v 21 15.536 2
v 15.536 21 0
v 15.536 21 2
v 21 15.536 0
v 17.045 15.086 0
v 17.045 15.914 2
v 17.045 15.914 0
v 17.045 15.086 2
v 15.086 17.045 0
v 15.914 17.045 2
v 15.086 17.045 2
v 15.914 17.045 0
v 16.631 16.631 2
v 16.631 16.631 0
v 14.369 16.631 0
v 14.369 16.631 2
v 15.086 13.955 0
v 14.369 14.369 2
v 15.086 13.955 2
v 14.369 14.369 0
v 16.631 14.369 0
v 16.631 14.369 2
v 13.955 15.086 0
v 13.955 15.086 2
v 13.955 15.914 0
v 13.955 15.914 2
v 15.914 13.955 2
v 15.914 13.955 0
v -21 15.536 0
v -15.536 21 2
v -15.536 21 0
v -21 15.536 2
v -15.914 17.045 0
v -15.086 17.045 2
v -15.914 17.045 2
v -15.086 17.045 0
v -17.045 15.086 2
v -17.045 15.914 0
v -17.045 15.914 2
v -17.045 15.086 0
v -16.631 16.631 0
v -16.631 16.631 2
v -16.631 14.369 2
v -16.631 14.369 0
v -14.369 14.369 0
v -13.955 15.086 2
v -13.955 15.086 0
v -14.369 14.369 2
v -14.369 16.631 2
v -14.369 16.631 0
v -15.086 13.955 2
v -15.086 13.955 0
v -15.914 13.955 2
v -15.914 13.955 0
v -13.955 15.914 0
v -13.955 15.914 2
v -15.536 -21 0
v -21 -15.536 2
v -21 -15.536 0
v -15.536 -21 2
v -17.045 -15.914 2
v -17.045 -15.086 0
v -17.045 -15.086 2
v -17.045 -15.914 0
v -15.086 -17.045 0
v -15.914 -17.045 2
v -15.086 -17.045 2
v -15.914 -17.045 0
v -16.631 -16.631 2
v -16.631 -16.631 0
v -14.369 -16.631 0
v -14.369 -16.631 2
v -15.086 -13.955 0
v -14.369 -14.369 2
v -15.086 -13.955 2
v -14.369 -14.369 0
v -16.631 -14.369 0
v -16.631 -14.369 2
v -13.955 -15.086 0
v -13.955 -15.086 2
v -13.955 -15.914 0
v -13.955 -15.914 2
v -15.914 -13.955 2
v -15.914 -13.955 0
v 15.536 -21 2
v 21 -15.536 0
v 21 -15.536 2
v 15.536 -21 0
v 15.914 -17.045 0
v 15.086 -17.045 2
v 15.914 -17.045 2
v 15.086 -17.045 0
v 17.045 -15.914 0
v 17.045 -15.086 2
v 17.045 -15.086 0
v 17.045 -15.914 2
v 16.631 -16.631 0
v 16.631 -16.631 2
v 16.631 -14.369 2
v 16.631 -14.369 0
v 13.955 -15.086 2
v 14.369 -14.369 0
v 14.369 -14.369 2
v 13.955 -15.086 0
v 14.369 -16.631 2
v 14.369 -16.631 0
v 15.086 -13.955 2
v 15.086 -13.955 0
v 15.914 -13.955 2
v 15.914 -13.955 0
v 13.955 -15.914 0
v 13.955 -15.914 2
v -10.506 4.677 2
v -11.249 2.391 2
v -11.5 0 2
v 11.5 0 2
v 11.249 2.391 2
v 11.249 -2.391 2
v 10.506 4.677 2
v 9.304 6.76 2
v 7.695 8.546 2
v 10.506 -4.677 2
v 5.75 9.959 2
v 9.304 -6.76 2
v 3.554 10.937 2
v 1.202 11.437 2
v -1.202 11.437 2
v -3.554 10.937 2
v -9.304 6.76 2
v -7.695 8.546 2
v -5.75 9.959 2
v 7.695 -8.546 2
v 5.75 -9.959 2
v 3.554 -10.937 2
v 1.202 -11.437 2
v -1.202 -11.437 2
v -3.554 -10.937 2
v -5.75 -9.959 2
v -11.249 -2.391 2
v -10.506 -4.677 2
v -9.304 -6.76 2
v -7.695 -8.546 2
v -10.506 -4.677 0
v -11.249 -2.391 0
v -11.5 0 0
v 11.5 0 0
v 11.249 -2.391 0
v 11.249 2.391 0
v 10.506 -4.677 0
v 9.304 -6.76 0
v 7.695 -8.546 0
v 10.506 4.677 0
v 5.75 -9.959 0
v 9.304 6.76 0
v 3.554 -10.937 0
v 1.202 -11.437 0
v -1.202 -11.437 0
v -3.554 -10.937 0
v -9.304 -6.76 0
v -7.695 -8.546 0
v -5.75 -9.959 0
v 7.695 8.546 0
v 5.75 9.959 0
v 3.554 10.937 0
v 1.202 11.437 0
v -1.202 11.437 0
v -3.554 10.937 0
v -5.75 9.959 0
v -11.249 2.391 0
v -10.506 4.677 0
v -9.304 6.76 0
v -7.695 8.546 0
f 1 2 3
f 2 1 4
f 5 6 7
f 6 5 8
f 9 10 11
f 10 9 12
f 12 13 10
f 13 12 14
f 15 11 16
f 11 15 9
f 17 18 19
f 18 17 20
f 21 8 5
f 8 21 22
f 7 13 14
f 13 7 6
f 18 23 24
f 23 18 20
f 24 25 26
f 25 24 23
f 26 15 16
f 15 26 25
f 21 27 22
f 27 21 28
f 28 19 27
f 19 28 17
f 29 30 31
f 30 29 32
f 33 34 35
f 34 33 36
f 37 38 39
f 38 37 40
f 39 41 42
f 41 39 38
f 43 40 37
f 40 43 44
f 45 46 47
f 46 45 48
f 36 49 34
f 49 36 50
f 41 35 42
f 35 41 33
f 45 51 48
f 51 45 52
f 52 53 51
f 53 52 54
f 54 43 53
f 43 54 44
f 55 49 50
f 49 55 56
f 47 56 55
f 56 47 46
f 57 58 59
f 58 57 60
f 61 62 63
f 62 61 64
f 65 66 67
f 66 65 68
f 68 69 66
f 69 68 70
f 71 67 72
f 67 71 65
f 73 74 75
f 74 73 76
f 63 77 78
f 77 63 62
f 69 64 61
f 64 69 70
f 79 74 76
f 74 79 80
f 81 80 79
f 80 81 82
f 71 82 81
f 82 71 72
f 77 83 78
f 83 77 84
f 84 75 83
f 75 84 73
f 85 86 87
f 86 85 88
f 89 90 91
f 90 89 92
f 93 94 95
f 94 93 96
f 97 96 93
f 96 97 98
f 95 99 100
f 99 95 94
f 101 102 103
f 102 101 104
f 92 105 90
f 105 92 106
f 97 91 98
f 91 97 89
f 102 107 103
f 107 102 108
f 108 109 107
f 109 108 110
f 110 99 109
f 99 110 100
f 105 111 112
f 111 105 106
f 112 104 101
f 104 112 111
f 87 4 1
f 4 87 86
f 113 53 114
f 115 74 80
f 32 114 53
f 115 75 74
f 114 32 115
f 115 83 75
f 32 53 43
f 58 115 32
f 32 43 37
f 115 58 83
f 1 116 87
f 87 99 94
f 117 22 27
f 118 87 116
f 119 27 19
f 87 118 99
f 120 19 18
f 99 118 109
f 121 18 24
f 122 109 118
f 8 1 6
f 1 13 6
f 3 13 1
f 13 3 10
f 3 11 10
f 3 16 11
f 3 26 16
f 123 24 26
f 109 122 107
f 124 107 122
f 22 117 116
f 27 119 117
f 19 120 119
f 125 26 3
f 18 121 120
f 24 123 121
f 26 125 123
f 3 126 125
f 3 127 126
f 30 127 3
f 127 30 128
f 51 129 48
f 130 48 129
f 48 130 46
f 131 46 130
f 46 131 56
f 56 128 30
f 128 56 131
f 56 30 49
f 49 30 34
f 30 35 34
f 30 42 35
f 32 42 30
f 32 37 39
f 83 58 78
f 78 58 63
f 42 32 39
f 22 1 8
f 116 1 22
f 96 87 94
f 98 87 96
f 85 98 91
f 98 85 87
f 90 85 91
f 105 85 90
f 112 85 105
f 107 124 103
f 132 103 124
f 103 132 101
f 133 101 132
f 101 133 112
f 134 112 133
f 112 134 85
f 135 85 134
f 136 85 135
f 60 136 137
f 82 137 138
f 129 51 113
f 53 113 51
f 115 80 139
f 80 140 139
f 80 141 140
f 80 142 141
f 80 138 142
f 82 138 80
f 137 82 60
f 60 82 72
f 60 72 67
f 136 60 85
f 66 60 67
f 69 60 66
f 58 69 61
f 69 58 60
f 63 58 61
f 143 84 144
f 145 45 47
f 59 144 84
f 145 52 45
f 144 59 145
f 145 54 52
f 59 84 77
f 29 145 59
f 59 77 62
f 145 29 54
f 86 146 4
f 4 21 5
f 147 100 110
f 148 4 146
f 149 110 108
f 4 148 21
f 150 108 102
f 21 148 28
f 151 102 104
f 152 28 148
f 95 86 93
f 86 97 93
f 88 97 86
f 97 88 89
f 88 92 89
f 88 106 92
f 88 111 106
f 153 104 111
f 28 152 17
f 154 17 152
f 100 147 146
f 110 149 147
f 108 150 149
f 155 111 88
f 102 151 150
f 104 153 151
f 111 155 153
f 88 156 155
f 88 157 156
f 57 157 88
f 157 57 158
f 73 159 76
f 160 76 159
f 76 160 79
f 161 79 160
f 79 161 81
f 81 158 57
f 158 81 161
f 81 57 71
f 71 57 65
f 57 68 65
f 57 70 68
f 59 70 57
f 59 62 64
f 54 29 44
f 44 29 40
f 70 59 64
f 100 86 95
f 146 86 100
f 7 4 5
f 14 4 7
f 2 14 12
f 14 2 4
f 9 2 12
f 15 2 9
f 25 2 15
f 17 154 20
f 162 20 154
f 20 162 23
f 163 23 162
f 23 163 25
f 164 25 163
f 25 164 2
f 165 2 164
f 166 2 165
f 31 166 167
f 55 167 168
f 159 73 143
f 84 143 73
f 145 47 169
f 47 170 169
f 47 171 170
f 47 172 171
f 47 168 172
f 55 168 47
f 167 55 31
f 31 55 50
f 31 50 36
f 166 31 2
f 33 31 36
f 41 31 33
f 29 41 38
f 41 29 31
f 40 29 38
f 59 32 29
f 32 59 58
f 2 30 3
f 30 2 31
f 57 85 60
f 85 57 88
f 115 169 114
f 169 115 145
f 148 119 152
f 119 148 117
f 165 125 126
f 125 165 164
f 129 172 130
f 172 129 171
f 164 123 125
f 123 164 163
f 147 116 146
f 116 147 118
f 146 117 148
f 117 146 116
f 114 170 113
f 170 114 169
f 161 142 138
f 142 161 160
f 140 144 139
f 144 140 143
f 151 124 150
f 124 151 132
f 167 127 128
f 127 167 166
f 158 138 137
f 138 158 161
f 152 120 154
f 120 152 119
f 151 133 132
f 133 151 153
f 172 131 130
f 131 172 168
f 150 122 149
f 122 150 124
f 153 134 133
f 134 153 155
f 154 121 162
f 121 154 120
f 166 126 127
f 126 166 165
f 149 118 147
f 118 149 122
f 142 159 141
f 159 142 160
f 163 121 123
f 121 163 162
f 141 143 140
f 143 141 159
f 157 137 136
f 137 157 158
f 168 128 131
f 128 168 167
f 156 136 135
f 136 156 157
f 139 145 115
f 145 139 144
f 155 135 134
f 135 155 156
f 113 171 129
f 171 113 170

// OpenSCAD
thickness=2;
hole_pitch=31;//26;
rad = 6;
notch = false;

module NEMA17_spacer(){
	//body
	difference(){
		translate([0,0,thickness/2]) cube([hole_pitch+11,hole_pitch+11,thickness],center=true);
		for(i=[0,1,2,3]){
			rotate([0,0,i*90+45]) union() {
				//translate([(hole_pitch-8)*sqrt(2)+2.5-2.5/sqrt(2),0,thickness/2]) {
				translate([(hole_pitch+11)*sqrt(2)/2-4.5*sqrt(2)+5,0,thickness/2]) {
					cube([5,10,thickness+.2],center=true);
				}
				translate([sqrt(2)*hole_pitch/2,0,0]) cylinder(r=3.2/2,h=thickness*4,center=true,$fn=12);
			}
			
		}
		cylinder(r=23/2,h=thickness*2.2,center=true); // Changed from 22.4 - AB

	// Corner notch added by AB
		if(notch)
		{
			translate([-hole_pitch/2+3,hole_pitch/2-1,0]) 
			{
					cylinder(r=rad, h=thickness*4,center=true,$fn=20);
					translate([-rad,3,0])
						cube([2*rad,2*rad+6,thickness*4],center=true);
					rotate([0,0,-45])
					translate([-3,rad+3,0])
						cube([2*rad+6,2*rad+6,thickness*4],center=true);
			}
		}
	}
}

NEMA17_spacer();
